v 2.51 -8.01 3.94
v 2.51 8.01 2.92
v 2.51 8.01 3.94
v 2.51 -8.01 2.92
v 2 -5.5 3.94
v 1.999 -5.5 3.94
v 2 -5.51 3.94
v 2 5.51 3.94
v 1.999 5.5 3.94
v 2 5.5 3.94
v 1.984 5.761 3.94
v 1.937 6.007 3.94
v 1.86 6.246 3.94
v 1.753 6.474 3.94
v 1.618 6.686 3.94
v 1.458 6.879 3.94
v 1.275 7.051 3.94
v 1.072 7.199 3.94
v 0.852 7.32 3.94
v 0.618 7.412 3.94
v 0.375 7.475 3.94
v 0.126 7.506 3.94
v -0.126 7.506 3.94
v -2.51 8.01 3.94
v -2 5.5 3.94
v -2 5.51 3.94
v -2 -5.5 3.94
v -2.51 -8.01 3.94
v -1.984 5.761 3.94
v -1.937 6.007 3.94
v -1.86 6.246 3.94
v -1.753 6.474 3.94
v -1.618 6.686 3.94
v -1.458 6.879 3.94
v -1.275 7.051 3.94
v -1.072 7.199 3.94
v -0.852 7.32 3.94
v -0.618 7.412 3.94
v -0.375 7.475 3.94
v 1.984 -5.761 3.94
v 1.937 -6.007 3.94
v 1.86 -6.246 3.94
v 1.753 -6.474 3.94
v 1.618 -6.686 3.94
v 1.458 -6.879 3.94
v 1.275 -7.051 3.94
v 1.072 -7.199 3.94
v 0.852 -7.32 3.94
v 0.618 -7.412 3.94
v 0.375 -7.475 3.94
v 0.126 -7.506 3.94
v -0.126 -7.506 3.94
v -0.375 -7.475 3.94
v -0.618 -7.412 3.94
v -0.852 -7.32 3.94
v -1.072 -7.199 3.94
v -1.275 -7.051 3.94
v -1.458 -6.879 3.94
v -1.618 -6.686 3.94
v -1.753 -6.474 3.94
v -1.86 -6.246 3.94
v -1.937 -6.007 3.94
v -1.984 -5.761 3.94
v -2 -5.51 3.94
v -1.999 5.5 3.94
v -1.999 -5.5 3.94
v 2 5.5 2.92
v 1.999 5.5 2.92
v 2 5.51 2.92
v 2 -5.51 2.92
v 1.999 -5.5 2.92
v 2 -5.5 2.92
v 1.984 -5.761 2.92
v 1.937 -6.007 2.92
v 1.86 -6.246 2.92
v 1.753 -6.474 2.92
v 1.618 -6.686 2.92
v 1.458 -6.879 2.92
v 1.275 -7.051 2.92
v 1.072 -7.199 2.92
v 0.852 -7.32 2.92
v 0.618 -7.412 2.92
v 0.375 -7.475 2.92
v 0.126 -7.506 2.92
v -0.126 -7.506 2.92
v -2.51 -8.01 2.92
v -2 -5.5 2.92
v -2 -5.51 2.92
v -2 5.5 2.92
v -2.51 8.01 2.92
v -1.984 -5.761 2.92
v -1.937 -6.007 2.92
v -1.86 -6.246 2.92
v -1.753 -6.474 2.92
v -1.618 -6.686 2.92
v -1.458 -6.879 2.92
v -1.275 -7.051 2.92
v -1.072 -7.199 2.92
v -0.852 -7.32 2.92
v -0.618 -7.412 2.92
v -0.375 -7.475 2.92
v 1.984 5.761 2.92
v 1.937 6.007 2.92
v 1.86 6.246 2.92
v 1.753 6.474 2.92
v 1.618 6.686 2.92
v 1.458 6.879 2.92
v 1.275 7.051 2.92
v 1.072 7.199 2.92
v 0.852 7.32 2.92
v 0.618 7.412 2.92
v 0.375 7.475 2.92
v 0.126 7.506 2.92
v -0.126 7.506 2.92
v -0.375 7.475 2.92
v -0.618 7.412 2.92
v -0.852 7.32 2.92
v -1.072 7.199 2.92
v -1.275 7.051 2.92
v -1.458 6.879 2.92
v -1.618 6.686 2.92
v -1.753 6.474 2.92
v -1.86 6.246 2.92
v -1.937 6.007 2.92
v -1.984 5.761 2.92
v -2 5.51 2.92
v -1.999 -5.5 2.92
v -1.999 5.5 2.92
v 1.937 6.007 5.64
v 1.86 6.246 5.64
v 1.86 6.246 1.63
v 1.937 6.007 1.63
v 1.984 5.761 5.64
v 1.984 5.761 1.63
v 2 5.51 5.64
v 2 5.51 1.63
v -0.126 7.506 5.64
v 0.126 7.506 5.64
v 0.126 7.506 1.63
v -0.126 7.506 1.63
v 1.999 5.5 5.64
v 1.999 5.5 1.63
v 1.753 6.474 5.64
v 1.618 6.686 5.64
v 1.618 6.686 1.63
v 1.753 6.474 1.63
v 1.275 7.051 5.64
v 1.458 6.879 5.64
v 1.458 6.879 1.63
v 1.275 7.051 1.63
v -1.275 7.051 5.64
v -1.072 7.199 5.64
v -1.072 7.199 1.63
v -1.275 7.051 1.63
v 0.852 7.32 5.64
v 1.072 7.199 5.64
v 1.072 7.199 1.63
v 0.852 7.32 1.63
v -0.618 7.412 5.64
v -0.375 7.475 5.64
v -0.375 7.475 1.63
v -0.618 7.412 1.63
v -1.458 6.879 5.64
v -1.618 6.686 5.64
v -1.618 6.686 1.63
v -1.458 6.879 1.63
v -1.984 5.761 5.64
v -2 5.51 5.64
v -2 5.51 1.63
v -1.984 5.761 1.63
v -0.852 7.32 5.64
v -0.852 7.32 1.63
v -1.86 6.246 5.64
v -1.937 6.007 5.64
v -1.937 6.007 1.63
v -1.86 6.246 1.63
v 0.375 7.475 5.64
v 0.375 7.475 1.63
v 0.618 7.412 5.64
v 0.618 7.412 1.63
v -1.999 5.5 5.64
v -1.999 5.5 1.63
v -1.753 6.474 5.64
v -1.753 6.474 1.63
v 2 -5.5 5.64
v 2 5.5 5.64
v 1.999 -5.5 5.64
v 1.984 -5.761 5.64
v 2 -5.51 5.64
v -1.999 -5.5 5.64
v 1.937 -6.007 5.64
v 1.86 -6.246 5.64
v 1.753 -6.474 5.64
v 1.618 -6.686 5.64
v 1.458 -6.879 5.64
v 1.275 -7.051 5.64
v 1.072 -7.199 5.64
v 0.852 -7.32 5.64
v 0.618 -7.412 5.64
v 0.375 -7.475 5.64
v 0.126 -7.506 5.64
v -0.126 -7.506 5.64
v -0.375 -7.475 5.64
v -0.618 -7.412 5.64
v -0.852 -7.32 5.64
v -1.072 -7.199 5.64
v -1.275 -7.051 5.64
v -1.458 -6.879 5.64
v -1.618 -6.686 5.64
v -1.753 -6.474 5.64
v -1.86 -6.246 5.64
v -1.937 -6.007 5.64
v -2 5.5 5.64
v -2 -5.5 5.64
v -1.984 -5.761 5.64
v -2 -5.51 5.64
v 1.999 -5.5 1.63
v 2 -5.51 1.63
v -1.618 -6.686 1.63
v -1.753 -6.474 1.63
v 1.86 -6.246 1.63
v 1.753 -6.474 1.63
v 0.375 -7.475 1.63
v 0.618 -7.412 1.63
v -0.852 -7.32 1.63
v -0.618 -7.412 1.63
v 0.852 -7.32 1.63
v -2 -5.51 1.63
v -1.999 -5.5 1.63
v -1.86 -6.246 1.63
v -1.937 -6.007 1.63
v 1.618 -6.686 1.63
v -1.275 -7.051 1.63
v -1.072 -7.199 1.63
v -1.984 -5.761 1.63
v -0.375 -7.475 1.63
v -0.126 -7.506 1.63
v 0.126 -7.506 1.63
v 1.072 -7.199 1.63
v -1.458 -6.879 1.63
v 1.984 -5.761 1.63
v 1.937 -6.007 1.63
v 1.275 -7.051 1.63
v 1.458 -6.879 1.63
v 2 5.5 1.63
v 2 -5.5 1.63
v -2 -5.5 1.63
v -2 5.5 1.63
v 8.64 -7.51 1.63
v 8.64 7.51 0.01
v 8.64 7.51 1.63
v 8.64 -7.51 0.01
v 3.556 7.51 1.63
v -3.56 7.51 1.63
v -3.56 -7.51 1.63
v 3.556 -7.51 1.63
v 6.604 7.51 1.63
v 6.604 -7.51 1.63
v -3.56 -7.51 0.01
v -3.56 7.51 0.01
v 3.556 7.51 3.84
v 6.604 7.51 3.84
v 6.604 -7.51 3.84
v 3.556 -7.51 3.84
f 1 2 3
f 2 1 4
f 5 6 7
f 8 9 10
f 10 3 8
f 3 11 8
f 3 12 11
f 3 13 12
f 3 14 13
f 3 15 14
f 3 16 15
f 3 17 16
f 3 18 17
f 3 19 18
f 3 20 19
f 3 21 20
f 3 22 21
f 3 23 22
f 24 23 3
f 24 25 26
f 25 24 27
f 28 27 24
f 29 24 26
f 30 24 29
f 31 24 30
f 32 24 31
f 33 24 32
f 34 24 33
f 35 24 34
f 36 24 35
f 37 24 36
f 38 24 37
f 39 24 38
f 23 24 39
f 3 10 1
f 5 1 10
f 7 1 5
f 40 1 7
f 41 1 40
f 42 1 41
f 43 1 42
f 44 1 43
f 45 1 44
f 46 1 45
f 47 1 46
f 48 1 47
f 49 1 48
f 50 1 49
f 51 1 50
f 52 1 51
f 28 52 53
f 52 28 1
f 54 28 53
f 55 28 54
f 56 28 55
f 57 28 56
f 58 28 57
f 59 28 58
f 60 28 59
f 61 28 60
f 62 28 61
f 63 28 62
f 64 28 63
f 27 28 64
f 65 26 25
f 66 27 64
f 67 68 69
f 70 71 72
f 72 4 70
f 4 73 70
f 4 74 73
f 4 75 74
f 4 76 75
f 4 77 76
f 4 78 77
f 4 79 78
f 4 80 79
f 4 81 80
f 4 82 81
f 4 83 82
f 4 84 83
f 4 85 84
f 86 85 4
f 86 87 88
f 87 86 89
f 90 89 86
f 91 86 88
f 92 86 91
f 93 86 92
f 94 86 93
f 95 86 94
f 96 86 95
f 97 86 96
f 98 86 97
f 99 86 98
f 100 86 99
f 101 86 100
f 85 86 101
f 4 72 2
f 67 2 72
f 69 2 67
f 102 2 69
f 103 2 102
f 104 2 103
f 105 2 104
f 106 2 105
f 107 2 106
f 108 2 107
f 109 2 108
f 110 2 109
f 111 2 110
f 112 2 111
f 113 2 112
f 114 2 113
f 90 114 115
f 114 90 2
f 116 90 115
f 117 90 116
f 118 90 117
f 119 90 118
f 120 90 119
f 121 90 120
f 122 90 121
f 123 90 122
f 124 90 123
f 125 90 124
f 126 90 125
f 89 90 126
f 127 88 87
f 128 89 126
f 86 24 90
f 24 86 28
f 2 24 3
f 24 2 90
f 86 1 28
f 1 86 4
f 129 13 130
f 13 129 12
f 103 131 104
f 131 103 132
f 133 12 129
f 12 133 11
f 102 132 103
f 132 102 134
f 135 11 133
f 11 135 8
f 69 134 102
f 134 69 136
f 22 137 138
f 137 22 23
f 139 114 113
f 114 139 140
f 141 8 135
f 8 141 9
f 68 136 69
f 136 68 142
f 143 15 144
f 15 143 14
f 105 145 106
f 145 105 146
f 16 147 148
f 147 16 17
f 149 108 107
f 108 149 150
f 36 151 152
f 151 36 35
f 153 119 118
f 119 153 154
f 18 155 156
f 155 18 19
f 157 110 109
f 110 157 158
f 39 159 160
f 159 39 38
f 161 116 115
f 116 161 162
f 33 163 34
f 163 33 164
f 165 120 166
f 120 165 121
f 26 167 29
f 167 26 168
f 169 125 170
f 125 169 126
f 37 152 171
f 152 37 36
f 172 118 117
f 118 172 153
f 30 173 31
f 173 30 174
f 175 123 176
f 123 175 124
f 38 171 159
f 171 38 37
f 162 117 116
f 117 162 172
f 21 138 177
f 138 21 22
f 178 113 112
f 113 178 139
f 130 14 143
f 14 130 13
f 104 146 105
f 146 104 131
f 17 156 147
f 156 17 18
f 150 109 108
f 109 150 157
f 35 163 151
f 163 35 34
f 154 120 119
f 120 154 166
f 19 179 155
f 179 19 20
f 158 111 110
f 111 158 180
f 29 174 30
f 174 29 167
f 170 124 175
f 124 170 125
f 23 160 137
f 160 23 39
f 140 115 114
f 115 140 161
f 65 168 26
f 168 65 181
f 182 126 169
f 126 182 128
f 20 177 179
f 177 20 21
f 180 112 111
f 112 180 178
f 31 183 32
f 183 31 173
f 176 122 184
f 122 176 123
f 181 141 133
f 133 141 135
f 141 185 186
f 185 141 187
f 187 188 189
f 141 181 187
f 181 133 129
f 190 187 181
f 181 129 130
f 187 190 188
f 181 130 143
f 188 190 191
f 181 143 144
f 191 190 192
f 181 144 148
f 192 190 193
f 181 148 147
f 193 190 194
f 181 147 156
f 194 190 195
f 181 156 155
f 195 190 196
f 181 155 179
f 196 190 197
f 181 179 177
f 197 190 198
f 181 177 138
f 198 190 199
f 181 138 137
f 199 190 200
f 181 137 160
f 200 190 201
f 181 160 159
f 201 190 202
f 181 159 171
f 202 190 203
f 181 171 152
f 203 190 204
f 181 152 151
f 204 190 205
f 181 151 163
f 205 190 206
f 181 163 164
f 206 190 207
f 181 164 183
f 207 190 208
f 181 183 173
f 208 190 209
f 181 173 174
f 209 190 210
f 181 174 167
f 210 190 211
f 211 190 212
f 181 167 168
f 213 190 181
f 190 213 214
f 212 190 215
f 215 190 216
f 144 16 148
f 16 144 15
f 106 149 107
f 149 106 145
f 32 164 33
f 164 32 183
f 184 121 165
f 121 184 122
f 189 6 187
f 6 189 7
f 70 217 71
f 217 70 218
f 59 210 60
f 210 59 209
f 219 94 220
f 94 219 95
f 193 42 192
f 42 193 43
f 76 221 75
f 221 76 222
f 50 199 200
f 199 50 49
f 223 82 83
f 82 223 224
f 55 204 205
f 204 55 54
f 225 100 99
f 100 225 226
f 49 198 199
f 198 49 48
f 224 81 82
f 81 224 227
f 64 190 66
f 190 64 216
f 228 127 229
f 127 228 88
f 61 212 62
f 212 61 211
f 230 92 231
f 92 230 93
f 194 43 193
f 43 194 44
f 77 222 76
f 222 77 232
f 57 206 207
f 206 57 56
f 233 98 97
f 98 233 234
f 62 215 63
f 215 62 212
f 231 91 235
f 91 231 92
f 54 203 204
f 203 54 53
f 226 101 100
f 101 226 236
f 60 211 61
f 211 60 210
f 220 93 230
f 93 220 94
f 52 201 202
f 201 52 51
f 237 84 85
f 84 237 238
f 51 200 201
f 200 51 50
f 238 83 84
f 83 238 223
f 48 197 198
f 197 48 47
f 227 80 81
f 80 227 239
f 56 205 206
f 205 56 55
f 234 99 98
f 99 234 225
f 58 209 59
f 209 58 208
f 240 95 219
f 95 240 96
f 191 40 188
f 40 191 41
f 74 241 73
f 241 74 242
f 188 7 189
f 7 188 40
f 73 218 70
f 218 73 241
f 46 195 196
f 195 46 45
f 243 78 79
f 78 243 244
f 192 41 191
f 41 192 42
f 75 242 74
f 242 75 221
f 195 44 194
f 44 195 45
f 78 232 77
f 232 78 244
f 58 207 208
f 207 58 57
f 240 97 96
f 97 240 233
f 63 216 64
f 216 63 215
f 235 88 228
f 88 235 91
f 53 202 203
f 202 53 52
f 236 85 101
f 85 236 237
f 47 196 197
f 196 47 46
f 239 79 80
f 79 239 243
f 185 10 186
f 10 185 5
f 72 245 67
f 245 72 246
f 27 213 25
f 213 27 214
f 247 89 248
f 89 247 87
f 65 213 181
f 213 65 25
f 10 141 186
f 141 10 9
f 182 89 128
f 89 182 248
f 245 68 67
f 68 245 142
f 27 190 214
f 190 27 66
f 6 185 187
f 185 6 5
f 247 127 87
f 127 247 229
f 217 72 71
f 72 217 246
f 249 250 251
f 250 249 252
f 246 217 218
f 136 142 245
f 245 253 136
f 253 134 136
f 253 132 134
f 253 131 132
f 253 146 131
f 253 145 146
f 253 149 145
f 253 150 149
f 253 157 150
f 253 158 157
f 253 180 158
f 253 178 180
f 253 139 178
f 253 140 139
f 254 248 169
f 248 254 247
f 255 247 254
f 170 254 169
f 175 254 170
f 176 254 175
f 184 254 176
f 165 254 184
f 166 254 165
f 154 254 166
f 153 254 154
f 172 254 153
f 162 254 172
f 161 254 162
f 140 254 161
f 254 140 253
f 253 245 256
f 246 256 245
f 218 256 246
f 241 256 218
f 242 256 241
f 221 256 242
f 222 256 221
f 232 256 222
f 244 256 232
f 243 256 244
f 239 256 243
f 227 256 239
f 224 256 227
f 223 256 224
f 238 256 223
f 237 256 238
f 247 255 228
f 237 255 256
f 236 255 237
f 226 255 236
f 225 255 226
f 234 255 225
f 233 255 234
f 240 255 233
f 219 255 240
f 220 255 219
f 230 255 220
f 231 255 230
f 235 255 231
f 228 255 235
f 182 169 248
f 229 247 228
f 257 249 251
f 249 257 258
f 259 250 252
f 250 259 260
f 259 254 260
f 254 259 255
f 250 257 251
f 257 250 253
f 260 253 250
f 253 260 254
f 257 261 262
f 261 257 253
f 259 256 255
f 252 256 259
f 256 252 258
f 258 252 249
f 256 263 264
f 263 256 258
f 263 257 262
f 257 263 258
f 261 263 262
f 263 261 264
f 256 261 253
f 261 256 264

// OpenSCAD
/* This is a cutout for a Magnet Pad Connector, 3 Pin, 2.54 Pitch.

   Includes the breakout pcb.

*/

/* ************************* */

$fn=50;

friction_fit = 0.02;
sliding_fit = 2;

/* ************************* */

//adjustments after printing once
print_adj_y = 1;
print_adj_flange_z = 0.2;
print_adj_flange_y = 1;


pogo_overall_y = 15 + friction_fit;
pogo_overall_x = 4 + friction_fit + print_adj_y;
pogo_overall_z = 4 + friction_fit;

flange_z = 0.8 + friction_fit + print_adj_flange_z;
flange_z_offset = 0.2;

edge_radius = 2;

pcb_x = 10.2 + sliding_fit;
pcb_y = pogo_overall_y; //9.9 actual
pcb_z = 1.6  + friction_fit;

connector_z_offset = pogo_overall_z/2 + pcb_z/2;
connector_x_offset = 2.54;

pogo_and_pcb_z_height = pcb_z + pogo_overall_z;

solder_connection_allowable_z = pogo_overall_z-1;
solder_connection_x = 2.54 * 1.2;

/* ************************* */

draw_pogo_magnet_and_pcb();

/* ************************* */

module draw_pogo_magnet_and_pcb(big_pcb=false)
{
    translate([0,0,pogo_overall_z/2+pcb_z])
    {
        spring_magnet();
        draw_pcb(big_pcb);
    }
}

module draw_pcb(big_pcb=false)
{
    translate([connector_x_offset, 0, -connector_z_offset + 0.01]) 
    {
    cube([pcb_x, pcb_y, pcb_z], center = true);
    
    if (big_pcb==false) translate([2.54,0,solder_connection_allowable_z/2]) cube([solder_connection_x,pcb_y,solder_connection_allowable_z], center = true);
    else translate([0,0,solder_connection_allowable_z/2]) cube([pcb_x,pcb_y,solder_connection_allowable_z+0.2], center = true);
    }
}

module spring_magnet()
{
    //flange
    translate([0,0,-0.2]) cube([pogo_overall_x,pogo_overall_y+print_adj_flange_y,flange_z], center=true);
    
    //body
    translate([0,pogo_overall_y/2-edge_radius,-pogo_overall_z/2]) cylinder(r=edge_radius, h=pogo_overall_z);
    translate([0,-pogo_overall_y/2+edge_radius,-pogo_overall_z/2]) cylinder(r=edge_radius, h=pogo_overall_z);
    translate([0,0,0]) cube([4,15-4,pogo_overall_z], center=true);
}
